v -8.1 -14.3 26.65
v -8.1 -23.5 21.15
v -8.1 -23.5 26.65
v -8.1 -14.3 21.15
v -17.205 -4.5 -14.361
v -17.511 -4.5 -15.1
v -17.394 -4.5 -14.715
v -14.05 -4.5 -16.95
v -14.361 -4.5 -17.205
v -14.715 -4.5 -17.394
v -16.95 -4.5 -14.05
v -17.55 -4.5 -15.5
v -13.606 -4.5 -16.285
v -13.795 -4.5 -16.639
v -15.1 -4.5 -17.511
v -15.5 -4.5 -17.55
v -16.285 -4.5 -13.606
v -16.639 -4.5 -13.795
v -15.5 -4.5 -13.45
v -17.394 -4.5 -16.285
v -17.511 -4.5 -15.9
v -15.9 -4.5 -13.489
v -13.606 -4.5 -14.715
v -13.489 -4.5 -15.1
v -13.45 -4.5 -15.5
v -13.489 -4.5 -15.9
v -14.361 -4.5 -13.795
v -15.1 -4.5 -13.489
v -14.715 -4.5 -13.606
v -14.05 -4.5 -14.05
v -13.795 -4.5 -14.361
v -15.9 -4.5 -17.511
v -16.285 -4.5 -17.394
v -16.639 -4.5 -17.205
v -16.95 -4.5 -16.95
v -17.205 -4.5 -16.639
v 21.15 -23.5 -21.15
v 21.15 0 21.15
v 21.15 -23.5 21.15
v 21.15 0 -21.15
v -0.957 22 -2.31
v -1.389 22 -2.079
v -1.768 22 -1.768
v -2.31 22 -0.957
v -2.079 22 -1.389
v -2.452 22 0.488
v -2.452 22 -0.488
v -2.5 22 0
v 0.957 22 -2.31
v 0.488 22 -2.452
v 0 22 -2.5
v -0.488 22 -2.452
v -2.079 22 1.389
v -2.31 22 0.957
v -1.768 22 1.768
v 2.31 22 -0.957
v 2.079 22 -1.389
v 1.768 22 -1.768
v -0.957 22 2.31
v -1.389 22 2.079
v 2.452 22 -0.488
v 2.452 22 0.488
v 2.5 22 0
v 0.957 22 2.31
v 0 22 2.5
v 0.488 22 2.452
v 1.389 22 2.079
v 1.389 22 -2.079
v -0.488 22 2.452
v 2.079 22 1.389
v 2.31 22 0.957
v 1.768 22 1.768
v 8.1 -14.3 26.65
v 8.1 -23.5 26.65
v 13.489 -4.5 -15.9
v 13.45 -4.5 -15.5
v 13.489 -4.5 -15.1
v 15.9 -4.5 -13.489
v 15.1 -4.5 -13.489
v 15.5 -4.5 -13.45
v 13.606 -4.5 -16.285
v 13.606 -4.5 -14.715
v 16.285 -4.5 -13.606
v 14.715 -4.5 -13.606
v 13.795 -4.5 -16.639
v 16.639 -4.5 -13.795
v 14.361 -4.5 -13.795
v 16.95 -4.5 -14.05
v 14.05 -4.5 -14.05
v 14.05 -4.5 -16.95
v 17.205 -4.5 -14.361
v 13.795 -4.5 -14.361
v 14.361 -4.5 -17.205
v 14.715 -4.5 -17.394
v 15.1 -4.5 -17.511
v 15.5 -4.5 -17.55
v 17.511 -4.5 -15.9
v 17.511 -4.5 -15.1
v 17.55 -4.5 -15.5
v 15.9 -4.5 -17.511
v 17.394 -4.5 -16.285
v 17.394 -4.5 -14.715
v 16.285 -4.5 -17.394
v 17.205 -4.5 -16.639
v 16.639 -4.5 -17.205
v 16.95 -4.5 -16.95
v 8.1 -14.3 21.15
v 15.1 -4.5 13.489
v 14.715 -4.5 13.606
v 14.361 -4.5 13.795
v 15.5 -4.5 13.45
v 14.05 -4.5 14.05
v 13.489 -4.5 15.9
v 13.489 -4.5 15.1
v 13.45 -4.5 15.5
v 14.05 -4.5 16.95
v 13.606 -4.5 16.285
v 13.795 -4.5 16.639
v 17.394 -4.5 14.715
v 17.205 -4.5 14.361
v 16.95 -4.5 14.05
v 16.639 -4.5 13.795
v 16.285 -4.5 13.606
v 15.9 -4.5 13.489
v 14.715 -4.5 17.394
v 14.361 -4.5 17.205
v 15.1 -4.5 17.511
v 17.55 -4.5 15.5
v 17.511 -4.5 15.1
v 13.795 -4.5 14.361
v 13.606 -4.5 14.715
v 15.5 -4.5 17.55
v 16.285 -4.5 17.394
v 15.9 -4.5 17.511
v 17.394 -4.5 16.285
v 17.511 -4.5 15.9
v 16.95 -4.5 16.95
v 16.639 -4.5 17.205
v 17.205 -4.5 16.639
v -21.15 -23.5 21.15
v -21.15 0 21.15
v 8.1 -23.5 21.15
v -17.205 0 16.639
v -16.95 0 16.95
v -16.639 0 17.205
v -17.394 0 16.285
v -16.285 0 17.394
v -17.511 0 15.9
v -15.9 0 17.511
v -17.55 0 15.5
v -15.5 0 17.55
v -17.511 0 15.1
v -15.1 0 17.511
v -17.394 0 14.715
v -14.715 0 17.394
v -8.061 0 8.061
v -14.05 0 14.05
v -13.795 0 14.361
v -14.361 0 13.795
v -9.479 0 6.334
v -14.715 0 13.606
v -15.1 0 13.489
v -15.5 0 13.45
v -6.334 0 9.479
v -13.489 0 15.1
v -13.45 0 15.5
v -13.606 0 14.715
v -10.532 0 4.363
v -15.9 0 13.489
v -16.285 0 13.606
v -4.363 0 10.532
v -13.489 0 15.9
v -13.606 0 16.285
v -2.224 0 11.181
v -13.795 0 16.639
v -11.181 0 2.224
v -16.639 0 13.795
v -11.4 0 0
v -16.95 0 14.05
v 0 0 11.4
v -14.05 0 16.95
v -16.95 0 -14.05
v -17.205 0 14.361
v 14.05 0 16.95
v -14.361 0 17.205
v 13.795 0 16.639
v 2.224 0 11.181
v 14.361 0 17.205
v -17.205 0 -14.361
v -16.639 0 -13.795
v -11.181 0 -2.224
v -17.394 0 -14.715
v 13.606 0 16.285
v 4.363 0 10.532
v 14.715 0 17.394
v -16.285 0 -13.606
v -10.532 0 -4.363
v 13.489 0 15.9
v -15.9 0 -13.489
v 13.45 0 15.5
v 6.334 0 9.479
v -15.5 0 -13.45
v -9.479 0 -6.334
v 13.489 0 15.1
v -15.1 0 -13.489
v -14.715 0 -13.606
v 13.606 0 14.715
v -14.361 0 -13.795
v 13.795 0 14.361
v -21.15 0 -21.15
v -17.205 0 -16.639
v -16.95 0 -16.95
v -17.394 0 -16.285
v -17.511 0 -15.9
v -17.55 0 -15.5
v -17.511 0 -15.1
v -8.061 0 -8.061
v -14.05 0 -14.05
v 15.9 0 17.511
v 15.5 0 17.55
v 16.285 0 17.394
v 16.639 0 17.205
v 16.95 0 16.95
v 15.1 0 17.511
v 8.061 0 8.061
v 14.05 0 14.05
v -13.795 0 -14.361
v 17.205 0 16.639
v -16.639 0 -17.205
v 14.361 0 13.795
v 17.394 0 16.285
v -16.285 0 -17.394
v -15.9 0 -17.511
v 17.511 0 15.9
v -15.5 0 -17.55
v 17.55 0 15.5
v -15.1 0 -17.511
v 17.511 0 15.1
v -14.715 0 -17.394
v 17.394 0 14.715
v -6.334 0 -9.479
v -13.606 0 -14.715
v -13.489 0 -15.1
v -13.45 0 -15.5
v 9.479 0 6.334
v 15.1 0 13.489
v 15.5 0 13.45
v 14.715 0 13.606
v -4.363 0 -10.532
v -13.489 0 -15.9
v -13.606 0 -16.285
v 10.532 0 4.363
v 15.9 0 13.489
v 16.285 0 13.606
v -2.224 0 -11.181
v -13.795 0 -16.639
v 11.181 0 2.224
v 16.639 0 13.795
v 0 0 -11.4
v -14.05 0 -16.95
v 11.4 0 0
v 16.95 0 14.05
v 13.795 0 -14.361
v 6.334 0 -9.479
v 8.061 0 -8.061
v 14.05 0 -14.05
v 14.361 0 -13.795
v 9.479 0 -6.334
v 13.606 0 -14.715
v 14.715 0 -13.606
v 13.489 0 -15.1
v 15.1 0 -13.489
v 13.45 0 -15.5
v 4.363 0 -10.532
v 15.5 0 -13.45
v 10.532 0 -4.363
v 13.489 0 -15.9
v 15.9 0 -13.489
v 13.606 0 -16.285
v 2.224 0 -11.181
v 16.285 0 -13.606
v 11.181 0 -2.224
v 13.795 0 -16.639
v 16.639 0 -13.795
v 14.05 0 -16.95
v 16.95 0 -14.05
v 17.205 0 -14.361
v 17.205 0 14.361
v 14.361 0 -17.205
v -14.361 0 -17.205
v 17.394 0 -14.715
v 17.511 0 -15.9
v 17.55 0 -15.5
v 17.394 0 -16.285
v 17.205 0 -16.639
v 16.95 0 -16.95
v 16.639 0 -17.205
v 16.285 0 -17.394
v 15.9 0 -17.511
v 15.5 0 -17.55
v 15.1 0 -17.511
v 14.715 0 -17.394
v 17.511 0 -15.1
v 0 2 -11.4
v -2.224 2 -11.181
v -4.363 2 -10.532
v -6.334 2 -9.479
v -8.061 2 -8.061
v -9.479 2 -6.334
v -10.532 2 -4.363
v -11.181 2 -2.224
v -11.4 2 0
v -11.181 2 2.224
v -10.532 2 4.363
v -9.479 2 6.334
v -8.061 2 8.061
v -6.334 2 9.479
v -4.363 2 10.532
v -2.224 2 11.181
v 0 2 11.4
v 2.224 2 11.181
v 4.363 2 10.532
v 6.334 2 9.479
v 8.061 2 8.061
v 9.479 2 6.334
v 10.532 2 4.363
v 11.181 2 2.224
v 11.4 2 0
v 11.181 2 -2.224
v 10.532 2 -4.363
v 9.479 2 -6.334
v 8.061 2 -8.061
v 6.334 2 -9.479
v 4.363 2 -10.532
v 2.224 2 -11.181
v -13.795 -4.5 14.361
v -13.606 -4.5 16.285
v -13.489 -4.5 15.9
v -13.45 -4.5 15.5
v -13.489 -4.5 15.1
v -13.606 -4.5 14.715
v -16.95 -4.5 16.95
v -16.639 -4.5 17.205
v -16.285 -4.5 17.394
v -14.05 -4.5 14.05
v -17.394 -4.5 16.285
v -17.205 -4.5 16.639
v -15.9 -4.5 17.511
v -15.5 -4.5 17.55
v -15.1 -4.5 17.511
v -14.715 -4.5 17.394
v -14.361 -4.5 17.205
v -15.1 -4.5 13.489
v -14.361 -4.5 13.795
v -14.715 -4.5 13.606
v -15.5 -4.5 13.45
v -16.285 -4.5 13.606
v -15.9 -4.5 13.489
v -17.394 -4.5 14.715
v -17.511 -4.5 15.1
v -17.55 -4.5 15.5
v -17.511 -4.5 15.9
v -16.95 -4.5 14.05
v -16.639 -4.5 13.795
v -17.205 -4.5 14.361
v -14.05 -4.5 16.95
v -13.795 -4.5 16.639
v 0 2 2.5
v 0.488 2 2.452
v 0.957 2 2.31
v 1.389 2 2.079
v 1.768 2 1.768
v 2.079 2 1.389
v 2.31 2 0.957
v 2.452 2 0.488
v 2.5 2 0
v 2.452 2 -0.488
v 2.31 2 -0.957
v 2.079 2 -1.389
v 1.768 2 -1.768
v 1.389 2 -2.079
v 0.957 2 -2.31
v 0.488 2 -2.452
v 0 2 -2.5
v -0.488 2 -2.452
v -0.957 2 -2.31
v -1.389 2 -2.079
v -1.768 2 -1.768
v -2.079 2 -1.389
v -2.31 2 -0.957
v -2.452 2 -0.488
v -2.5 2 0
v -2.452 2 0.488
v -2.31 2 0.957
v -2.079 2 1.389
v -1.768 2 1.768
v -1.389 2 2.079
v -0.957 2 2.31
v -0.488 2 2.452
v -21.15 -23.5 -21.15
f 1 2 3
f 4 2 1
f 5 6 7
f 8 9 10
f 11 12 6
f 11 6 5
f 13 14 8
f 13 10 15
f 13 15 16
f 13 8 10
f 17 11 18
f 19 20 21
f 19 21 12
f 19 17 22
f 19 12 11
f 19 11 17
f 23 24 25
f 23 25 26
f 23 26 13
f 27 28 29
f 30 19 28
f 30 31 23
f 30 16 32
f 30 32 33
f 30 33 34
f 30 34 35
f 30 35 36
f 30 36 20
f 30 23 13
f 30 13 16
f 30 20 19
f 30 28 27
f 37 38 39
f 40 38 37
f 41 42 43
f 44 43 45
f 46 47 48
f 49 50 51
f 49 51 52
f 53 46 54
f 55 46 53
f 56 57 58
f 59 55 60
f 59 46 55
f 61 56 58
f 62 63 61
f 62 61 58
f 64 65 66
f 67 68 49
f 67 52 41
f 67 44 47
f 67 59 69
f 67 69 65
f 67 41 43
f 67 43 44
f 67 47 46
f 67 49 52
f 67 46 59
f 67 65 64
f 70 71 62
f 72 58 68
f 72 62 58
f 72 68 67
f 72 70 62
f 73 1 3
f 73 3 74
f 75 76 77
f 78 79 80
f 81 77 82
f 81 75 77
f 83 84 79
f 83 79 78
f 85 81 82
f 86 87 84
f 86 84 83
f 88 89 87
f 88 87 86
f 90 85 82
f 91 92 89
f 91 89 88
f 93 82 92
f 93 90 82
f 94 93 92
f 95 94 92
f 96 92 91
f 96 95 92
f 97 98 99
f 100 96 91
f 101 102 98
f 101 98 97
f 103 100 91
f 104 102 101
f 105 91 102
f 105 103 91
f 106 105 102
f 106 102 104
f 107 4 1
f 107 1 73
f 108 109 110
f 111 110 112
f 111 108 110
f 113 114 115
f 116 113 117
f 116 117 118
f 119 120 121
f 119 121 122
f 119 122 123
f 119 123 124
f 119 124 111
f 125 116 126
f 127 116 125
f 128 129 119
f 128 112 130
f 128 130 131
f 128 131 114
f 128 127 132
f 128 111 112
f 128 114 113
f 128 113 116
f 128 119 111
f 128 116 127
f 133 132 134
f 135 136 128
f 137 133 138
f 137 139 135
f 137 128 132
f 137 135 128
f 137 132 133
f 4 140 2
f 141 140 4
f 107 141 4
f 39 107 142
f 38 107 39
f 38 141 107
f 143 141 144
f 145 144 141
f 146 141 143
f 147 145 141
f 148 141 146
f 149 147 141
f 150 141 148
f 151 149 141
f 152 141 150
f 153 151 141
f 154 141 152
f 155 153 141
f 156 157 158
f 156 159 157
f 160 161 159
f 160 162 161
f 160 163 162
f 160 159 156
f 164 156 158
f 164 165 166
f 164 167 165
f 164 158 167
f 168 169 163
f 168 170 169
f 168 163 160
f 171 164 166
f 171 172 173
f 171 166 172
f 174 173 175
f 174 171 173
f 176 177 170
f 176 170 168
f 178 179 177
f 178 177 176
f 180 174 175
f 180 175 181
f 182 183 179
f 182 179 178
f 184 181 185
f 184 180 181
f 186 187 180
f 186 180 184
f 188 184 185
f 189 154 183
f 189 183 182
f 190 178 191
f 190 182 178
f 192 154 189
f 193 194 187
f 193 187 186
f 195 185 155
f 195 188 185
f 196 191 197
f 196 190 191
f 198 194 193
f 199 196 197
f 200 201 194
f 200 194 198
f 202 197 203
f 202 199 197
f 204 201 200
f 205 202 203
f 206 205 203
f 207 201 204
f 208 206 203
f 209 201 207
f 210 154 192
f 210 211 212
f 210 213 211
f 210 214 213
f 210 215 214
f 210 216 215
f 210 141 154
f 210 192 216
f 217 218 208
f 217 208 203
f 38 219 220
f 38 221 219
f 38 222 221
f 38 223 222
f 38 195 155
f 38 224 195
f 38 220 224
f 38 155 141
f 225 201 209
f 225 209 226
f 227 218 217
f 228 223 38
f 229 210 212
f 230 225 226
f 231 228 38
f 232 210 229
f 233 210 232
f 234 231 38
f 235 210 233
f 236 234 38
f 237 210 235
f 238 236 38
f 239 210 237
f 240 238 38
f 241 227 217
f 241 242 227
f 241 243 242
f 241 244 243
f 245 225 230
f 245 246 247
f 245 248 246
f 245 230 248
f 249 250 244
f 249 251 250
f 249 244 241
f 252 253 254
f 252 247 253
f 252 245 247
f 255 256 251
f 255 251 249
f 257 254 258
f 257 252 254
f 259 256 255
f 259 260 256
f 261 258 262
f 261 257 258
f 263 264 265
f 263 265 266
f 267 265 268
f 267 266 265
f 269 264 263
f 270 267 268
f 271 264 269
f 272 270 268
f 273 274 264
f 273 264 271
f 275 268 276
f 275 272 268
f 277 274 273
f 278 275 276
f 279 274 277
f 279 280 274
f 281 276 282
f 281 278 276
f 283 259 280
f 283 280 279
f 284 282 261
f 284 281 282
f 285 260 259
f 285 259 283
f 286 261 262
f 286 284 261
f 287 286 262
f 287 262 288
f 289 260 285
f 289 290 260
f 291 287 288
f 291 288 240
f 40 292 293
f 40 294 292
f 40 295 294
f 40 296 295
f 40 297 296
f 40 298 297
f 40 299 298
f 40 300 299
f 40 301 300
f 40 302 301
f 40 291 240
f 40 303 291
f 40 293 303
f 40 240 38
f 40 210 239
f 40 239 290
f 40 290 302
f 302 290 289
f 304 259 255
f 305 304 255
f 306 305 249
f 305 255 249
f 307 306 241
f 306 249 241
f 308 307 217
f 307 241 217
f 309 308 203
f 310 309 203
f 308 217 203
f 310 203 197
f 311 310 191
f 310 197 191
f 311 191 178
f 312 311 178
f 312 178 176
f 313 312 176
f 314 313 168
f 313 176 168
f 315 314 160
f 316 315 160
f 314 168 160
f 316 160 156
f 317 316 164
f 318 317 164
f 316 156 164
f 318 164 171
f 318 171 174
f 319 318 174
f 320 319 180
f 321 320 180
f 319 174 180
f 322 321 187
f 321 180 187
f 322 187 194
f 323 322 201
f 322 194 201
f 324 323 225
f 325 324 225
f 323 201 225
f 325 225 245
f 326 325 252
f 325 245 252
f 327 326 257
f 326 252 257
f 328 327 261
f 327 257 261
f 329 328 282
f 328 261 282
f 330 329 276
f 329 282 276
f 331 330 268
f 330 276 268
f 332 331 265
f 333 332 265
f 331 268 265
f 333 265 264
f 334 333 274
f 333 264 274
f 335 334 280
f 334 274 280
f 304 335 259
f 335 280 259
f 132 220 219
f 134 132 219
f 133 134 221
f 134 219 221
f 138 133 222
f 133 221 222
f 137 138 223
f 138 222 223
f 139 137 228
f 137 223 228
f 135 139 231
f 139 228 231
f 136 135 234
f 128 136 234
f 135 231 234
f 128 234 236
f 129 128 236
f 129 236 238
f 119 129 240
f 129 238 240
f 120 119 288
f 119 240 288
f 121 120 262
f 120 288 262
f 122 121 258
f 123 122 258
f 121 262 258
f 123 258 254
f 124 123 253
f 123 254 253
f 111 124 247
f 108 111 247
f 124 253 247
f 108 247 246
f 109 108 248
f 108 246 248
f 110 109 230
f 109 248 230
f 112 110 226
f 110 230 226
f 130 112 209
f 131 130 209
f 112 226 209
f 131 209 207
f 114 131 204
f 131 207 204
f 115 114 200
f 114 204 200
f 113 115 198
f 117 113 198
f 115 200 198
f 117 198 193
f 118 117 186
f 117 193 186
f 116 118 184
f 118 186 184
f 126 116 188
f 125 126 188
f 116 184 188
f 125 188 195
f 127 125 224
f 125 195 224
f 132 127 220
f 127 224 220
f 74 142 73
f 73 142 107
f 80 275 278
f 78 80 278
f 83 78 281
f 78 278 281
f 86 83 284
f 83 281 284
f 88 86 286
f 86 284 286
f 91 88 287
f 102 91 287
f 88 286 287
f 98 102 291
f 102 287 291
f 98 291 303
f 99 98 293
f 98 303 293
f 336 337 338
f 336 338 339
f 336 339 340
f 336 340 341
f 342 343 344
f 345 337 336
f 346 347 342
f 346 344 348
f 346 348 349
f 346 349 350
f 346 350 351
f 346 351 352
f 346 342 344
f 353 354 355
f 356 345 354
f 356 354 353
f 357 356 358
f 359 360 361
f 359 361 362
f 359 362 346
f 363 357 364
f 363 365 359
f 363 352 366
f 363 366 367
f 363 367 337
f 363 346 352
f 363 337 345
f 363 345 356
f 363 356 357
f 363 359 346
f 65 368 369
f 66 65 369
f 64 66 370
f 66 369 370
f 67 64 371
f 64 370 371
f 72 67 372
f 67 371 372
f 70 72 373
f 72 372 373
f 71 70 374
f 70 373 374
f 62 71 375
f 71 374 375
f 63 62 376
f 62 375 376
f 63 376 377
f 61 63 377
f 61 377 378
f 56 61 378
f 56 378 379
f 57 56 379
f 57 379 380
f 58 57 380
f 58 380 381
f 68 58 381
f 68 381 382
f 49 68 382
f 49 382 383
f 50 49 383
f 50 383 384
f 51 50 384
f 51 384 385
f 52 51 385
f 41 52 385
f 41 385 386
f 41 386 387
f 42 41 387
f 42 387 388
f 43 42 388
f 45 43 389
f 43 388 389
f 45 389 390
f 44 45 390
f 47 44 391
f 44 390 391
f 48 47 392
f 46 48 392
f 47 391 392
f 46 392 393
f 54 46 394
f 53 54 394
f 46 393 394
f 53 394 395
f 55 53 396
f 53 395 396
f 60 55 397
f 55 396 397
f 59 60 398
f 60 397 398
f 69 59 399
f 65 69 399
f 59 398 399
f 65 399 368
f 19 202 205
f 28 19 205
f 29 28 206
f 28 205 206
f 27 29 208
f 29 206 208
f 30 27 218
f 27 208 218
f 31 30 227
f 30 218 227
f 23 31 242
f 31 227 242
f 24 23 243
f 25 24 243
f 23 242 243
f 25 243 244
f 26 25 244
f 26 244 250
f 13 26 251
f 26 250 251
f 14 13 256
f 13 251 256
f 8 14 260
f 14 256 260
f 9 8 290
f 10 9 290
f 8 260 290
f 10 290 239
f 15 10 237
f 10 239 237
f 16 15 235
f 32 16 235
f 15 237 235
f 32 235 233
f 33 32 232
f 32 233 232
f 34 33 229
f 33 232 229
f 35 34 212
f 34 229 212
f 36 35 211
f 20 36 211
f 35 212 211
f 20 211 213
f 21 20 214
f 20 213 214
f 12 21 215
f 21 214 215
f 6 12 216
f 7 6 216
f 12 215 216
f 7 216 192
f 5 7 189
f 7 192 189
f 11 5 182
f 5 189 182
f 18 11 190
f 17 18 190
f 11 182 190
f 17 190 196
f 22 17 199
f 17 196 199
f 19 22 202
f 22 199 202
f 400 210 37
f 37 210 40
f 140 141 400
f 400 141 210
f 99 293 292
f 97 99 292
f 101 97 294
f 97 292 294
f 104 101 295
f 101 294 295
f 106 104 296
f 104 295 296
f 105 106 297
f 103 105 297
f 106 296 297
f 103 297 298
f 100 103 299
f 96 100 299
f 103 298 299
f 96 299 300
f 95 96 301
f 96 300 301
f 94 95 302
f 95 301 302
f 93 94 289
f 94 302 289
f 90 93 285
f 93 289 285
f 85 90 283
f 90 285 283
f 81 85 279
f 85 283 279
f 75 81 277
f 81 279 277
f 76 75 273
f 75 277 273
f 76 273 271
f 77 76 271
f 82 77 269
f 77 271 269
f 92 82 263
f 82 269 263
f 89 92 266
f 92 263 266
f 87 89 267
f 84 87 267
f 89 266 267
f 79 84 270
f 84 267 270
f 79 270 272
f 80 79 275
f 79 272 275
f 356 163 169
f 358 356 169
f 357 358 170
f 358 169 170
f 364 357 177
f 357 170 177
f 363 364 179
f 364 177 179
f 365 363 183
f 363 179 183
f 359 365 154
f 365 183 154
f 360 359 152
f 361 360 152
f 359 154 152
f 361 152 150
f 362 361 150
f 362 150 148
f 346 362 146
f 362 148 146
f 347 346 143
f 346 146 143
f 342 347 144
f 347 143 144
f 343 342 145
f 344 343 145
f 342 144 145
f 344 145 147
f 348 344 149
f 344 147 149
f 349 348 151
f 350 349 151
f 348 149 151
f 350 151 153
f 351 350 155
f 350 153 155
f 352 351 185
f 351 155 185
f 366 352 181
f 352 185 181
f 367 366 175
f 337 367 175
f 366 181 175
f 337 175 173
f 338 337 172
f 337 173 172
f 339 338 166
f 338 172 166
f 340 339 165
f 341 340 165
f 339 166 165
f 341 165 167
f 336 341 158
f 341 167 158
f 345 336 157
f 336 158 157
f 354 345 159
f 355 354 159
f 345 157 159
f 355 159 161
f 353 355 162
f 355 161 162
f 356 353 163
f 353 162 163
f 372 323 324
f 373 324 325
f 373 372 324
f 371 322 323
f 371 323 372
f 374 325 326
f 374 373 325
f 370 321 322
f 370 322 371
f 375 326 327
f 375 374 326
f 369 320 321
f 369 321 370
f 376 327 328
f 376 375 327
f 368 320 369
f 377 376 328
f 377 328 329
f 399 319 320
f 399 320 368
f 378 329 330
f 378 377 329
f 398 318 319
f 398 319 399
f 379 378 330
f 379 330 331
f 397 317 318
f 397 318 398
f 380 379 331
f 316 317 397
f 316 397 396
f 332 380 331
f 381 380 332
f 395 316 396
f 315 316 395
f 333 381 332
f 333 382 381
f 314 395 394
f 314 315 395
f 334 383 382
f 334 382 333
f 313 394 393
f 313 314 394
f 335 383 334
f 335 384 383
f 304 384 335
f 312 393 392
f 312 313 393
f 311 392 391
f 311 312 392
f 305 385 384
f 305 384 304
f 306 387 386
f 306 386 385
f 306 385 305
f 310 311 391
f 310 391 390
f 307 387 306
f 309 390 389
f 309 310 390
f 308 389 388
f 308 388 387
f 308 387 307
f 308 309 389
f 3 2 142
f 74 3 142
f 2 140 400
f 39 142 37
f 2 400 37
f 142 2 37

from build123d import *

# Parameters (mm, degrees)
SKETCH1_W           = 42.3
SKETCH1_H           = 42.3
BOSS_EXTRUDE1_DEPTH = 23.5
SKETCH2_R           = 2.05
CUT_EXTRUDE1_DEPTH  = 4.5
SKETCH3_R           = 11.4
BOSS_EXTRUDE2_DEPTH = 2
SKETCH3_3_R         = 2.5
BOSS_EXTRUDE3_DEPTH = 22
SKETCH4_W           = 16.2
SKETCH4_H           = 9.2
BOSS_EXTRUDE4_DEPTH = 5.5


with BuildPart() as part:
    # Sketch1 → Boss-Extrude1 (new body)
    with BuildSketch(Plane(origin=(0, 0, 0), x_dir=(1, 0, 0), z_dir=(0, 1, 0))):
        Rectangle(SKETCH1_W, SKETCH1_H)
    extrude(amount=-BOSS_EXTRUDE1_DEPTH)

    # Sketch2 → Cut-Extrude1 (cut)
    with BuildSketch(Plane(origin=(0, 0, 0), x_dir=(1, 0, 0), z_dir=(0, 1, 0))):
        with Locations((-15.5, -15.5)):
            Circle(SKETCH2_R)
        with Locations((15.5, -15.5)):
            Circle(SKETCH2_R)
        with Locations((-15.5, 15.5)):
            Circle(SKETCH2_R)
        with Locations((15.5, 15.5)):
            Circle(SKETCH2_R)
    extrude(amount=-CUT_EXTRUDE1_DEPTH, mode=Mode.SUBTRACT)

    # Sketch3 → Boss-Extrude2 (add)
    with BuildSketch(Plane(origin=(0, 0, 0), x_dir=(1, 0, 0), z_dir=(0, 1, 0))):
        Circle(SKETCH3_R)
    extrude(amount=BOSS_EXTRUDE2_DEPTH)

    # Sketch3<3> → Boss-Extrude3 (add)
    with BuildSketch(Plane(origin=(0, 0, 0), x_dir=(1, 0, 0), z_dir=(0, 1, 0))):
        Circle(SKETCH3_3_R)
    extrude(amount=BOSS_EXTRUDE3_DEPTH)

    # Sketch4 → Boss-Extrude4 (add)
    with BuildSketch(Plane.XY.offset(21.15)):
        with Locations((0, -18.9)):
            Rectangle(SKETCH4_W, SKETCH4_H)
    extrude(amount=BOSS_EXTRUDE4_DEPTH)


solid = part.part
